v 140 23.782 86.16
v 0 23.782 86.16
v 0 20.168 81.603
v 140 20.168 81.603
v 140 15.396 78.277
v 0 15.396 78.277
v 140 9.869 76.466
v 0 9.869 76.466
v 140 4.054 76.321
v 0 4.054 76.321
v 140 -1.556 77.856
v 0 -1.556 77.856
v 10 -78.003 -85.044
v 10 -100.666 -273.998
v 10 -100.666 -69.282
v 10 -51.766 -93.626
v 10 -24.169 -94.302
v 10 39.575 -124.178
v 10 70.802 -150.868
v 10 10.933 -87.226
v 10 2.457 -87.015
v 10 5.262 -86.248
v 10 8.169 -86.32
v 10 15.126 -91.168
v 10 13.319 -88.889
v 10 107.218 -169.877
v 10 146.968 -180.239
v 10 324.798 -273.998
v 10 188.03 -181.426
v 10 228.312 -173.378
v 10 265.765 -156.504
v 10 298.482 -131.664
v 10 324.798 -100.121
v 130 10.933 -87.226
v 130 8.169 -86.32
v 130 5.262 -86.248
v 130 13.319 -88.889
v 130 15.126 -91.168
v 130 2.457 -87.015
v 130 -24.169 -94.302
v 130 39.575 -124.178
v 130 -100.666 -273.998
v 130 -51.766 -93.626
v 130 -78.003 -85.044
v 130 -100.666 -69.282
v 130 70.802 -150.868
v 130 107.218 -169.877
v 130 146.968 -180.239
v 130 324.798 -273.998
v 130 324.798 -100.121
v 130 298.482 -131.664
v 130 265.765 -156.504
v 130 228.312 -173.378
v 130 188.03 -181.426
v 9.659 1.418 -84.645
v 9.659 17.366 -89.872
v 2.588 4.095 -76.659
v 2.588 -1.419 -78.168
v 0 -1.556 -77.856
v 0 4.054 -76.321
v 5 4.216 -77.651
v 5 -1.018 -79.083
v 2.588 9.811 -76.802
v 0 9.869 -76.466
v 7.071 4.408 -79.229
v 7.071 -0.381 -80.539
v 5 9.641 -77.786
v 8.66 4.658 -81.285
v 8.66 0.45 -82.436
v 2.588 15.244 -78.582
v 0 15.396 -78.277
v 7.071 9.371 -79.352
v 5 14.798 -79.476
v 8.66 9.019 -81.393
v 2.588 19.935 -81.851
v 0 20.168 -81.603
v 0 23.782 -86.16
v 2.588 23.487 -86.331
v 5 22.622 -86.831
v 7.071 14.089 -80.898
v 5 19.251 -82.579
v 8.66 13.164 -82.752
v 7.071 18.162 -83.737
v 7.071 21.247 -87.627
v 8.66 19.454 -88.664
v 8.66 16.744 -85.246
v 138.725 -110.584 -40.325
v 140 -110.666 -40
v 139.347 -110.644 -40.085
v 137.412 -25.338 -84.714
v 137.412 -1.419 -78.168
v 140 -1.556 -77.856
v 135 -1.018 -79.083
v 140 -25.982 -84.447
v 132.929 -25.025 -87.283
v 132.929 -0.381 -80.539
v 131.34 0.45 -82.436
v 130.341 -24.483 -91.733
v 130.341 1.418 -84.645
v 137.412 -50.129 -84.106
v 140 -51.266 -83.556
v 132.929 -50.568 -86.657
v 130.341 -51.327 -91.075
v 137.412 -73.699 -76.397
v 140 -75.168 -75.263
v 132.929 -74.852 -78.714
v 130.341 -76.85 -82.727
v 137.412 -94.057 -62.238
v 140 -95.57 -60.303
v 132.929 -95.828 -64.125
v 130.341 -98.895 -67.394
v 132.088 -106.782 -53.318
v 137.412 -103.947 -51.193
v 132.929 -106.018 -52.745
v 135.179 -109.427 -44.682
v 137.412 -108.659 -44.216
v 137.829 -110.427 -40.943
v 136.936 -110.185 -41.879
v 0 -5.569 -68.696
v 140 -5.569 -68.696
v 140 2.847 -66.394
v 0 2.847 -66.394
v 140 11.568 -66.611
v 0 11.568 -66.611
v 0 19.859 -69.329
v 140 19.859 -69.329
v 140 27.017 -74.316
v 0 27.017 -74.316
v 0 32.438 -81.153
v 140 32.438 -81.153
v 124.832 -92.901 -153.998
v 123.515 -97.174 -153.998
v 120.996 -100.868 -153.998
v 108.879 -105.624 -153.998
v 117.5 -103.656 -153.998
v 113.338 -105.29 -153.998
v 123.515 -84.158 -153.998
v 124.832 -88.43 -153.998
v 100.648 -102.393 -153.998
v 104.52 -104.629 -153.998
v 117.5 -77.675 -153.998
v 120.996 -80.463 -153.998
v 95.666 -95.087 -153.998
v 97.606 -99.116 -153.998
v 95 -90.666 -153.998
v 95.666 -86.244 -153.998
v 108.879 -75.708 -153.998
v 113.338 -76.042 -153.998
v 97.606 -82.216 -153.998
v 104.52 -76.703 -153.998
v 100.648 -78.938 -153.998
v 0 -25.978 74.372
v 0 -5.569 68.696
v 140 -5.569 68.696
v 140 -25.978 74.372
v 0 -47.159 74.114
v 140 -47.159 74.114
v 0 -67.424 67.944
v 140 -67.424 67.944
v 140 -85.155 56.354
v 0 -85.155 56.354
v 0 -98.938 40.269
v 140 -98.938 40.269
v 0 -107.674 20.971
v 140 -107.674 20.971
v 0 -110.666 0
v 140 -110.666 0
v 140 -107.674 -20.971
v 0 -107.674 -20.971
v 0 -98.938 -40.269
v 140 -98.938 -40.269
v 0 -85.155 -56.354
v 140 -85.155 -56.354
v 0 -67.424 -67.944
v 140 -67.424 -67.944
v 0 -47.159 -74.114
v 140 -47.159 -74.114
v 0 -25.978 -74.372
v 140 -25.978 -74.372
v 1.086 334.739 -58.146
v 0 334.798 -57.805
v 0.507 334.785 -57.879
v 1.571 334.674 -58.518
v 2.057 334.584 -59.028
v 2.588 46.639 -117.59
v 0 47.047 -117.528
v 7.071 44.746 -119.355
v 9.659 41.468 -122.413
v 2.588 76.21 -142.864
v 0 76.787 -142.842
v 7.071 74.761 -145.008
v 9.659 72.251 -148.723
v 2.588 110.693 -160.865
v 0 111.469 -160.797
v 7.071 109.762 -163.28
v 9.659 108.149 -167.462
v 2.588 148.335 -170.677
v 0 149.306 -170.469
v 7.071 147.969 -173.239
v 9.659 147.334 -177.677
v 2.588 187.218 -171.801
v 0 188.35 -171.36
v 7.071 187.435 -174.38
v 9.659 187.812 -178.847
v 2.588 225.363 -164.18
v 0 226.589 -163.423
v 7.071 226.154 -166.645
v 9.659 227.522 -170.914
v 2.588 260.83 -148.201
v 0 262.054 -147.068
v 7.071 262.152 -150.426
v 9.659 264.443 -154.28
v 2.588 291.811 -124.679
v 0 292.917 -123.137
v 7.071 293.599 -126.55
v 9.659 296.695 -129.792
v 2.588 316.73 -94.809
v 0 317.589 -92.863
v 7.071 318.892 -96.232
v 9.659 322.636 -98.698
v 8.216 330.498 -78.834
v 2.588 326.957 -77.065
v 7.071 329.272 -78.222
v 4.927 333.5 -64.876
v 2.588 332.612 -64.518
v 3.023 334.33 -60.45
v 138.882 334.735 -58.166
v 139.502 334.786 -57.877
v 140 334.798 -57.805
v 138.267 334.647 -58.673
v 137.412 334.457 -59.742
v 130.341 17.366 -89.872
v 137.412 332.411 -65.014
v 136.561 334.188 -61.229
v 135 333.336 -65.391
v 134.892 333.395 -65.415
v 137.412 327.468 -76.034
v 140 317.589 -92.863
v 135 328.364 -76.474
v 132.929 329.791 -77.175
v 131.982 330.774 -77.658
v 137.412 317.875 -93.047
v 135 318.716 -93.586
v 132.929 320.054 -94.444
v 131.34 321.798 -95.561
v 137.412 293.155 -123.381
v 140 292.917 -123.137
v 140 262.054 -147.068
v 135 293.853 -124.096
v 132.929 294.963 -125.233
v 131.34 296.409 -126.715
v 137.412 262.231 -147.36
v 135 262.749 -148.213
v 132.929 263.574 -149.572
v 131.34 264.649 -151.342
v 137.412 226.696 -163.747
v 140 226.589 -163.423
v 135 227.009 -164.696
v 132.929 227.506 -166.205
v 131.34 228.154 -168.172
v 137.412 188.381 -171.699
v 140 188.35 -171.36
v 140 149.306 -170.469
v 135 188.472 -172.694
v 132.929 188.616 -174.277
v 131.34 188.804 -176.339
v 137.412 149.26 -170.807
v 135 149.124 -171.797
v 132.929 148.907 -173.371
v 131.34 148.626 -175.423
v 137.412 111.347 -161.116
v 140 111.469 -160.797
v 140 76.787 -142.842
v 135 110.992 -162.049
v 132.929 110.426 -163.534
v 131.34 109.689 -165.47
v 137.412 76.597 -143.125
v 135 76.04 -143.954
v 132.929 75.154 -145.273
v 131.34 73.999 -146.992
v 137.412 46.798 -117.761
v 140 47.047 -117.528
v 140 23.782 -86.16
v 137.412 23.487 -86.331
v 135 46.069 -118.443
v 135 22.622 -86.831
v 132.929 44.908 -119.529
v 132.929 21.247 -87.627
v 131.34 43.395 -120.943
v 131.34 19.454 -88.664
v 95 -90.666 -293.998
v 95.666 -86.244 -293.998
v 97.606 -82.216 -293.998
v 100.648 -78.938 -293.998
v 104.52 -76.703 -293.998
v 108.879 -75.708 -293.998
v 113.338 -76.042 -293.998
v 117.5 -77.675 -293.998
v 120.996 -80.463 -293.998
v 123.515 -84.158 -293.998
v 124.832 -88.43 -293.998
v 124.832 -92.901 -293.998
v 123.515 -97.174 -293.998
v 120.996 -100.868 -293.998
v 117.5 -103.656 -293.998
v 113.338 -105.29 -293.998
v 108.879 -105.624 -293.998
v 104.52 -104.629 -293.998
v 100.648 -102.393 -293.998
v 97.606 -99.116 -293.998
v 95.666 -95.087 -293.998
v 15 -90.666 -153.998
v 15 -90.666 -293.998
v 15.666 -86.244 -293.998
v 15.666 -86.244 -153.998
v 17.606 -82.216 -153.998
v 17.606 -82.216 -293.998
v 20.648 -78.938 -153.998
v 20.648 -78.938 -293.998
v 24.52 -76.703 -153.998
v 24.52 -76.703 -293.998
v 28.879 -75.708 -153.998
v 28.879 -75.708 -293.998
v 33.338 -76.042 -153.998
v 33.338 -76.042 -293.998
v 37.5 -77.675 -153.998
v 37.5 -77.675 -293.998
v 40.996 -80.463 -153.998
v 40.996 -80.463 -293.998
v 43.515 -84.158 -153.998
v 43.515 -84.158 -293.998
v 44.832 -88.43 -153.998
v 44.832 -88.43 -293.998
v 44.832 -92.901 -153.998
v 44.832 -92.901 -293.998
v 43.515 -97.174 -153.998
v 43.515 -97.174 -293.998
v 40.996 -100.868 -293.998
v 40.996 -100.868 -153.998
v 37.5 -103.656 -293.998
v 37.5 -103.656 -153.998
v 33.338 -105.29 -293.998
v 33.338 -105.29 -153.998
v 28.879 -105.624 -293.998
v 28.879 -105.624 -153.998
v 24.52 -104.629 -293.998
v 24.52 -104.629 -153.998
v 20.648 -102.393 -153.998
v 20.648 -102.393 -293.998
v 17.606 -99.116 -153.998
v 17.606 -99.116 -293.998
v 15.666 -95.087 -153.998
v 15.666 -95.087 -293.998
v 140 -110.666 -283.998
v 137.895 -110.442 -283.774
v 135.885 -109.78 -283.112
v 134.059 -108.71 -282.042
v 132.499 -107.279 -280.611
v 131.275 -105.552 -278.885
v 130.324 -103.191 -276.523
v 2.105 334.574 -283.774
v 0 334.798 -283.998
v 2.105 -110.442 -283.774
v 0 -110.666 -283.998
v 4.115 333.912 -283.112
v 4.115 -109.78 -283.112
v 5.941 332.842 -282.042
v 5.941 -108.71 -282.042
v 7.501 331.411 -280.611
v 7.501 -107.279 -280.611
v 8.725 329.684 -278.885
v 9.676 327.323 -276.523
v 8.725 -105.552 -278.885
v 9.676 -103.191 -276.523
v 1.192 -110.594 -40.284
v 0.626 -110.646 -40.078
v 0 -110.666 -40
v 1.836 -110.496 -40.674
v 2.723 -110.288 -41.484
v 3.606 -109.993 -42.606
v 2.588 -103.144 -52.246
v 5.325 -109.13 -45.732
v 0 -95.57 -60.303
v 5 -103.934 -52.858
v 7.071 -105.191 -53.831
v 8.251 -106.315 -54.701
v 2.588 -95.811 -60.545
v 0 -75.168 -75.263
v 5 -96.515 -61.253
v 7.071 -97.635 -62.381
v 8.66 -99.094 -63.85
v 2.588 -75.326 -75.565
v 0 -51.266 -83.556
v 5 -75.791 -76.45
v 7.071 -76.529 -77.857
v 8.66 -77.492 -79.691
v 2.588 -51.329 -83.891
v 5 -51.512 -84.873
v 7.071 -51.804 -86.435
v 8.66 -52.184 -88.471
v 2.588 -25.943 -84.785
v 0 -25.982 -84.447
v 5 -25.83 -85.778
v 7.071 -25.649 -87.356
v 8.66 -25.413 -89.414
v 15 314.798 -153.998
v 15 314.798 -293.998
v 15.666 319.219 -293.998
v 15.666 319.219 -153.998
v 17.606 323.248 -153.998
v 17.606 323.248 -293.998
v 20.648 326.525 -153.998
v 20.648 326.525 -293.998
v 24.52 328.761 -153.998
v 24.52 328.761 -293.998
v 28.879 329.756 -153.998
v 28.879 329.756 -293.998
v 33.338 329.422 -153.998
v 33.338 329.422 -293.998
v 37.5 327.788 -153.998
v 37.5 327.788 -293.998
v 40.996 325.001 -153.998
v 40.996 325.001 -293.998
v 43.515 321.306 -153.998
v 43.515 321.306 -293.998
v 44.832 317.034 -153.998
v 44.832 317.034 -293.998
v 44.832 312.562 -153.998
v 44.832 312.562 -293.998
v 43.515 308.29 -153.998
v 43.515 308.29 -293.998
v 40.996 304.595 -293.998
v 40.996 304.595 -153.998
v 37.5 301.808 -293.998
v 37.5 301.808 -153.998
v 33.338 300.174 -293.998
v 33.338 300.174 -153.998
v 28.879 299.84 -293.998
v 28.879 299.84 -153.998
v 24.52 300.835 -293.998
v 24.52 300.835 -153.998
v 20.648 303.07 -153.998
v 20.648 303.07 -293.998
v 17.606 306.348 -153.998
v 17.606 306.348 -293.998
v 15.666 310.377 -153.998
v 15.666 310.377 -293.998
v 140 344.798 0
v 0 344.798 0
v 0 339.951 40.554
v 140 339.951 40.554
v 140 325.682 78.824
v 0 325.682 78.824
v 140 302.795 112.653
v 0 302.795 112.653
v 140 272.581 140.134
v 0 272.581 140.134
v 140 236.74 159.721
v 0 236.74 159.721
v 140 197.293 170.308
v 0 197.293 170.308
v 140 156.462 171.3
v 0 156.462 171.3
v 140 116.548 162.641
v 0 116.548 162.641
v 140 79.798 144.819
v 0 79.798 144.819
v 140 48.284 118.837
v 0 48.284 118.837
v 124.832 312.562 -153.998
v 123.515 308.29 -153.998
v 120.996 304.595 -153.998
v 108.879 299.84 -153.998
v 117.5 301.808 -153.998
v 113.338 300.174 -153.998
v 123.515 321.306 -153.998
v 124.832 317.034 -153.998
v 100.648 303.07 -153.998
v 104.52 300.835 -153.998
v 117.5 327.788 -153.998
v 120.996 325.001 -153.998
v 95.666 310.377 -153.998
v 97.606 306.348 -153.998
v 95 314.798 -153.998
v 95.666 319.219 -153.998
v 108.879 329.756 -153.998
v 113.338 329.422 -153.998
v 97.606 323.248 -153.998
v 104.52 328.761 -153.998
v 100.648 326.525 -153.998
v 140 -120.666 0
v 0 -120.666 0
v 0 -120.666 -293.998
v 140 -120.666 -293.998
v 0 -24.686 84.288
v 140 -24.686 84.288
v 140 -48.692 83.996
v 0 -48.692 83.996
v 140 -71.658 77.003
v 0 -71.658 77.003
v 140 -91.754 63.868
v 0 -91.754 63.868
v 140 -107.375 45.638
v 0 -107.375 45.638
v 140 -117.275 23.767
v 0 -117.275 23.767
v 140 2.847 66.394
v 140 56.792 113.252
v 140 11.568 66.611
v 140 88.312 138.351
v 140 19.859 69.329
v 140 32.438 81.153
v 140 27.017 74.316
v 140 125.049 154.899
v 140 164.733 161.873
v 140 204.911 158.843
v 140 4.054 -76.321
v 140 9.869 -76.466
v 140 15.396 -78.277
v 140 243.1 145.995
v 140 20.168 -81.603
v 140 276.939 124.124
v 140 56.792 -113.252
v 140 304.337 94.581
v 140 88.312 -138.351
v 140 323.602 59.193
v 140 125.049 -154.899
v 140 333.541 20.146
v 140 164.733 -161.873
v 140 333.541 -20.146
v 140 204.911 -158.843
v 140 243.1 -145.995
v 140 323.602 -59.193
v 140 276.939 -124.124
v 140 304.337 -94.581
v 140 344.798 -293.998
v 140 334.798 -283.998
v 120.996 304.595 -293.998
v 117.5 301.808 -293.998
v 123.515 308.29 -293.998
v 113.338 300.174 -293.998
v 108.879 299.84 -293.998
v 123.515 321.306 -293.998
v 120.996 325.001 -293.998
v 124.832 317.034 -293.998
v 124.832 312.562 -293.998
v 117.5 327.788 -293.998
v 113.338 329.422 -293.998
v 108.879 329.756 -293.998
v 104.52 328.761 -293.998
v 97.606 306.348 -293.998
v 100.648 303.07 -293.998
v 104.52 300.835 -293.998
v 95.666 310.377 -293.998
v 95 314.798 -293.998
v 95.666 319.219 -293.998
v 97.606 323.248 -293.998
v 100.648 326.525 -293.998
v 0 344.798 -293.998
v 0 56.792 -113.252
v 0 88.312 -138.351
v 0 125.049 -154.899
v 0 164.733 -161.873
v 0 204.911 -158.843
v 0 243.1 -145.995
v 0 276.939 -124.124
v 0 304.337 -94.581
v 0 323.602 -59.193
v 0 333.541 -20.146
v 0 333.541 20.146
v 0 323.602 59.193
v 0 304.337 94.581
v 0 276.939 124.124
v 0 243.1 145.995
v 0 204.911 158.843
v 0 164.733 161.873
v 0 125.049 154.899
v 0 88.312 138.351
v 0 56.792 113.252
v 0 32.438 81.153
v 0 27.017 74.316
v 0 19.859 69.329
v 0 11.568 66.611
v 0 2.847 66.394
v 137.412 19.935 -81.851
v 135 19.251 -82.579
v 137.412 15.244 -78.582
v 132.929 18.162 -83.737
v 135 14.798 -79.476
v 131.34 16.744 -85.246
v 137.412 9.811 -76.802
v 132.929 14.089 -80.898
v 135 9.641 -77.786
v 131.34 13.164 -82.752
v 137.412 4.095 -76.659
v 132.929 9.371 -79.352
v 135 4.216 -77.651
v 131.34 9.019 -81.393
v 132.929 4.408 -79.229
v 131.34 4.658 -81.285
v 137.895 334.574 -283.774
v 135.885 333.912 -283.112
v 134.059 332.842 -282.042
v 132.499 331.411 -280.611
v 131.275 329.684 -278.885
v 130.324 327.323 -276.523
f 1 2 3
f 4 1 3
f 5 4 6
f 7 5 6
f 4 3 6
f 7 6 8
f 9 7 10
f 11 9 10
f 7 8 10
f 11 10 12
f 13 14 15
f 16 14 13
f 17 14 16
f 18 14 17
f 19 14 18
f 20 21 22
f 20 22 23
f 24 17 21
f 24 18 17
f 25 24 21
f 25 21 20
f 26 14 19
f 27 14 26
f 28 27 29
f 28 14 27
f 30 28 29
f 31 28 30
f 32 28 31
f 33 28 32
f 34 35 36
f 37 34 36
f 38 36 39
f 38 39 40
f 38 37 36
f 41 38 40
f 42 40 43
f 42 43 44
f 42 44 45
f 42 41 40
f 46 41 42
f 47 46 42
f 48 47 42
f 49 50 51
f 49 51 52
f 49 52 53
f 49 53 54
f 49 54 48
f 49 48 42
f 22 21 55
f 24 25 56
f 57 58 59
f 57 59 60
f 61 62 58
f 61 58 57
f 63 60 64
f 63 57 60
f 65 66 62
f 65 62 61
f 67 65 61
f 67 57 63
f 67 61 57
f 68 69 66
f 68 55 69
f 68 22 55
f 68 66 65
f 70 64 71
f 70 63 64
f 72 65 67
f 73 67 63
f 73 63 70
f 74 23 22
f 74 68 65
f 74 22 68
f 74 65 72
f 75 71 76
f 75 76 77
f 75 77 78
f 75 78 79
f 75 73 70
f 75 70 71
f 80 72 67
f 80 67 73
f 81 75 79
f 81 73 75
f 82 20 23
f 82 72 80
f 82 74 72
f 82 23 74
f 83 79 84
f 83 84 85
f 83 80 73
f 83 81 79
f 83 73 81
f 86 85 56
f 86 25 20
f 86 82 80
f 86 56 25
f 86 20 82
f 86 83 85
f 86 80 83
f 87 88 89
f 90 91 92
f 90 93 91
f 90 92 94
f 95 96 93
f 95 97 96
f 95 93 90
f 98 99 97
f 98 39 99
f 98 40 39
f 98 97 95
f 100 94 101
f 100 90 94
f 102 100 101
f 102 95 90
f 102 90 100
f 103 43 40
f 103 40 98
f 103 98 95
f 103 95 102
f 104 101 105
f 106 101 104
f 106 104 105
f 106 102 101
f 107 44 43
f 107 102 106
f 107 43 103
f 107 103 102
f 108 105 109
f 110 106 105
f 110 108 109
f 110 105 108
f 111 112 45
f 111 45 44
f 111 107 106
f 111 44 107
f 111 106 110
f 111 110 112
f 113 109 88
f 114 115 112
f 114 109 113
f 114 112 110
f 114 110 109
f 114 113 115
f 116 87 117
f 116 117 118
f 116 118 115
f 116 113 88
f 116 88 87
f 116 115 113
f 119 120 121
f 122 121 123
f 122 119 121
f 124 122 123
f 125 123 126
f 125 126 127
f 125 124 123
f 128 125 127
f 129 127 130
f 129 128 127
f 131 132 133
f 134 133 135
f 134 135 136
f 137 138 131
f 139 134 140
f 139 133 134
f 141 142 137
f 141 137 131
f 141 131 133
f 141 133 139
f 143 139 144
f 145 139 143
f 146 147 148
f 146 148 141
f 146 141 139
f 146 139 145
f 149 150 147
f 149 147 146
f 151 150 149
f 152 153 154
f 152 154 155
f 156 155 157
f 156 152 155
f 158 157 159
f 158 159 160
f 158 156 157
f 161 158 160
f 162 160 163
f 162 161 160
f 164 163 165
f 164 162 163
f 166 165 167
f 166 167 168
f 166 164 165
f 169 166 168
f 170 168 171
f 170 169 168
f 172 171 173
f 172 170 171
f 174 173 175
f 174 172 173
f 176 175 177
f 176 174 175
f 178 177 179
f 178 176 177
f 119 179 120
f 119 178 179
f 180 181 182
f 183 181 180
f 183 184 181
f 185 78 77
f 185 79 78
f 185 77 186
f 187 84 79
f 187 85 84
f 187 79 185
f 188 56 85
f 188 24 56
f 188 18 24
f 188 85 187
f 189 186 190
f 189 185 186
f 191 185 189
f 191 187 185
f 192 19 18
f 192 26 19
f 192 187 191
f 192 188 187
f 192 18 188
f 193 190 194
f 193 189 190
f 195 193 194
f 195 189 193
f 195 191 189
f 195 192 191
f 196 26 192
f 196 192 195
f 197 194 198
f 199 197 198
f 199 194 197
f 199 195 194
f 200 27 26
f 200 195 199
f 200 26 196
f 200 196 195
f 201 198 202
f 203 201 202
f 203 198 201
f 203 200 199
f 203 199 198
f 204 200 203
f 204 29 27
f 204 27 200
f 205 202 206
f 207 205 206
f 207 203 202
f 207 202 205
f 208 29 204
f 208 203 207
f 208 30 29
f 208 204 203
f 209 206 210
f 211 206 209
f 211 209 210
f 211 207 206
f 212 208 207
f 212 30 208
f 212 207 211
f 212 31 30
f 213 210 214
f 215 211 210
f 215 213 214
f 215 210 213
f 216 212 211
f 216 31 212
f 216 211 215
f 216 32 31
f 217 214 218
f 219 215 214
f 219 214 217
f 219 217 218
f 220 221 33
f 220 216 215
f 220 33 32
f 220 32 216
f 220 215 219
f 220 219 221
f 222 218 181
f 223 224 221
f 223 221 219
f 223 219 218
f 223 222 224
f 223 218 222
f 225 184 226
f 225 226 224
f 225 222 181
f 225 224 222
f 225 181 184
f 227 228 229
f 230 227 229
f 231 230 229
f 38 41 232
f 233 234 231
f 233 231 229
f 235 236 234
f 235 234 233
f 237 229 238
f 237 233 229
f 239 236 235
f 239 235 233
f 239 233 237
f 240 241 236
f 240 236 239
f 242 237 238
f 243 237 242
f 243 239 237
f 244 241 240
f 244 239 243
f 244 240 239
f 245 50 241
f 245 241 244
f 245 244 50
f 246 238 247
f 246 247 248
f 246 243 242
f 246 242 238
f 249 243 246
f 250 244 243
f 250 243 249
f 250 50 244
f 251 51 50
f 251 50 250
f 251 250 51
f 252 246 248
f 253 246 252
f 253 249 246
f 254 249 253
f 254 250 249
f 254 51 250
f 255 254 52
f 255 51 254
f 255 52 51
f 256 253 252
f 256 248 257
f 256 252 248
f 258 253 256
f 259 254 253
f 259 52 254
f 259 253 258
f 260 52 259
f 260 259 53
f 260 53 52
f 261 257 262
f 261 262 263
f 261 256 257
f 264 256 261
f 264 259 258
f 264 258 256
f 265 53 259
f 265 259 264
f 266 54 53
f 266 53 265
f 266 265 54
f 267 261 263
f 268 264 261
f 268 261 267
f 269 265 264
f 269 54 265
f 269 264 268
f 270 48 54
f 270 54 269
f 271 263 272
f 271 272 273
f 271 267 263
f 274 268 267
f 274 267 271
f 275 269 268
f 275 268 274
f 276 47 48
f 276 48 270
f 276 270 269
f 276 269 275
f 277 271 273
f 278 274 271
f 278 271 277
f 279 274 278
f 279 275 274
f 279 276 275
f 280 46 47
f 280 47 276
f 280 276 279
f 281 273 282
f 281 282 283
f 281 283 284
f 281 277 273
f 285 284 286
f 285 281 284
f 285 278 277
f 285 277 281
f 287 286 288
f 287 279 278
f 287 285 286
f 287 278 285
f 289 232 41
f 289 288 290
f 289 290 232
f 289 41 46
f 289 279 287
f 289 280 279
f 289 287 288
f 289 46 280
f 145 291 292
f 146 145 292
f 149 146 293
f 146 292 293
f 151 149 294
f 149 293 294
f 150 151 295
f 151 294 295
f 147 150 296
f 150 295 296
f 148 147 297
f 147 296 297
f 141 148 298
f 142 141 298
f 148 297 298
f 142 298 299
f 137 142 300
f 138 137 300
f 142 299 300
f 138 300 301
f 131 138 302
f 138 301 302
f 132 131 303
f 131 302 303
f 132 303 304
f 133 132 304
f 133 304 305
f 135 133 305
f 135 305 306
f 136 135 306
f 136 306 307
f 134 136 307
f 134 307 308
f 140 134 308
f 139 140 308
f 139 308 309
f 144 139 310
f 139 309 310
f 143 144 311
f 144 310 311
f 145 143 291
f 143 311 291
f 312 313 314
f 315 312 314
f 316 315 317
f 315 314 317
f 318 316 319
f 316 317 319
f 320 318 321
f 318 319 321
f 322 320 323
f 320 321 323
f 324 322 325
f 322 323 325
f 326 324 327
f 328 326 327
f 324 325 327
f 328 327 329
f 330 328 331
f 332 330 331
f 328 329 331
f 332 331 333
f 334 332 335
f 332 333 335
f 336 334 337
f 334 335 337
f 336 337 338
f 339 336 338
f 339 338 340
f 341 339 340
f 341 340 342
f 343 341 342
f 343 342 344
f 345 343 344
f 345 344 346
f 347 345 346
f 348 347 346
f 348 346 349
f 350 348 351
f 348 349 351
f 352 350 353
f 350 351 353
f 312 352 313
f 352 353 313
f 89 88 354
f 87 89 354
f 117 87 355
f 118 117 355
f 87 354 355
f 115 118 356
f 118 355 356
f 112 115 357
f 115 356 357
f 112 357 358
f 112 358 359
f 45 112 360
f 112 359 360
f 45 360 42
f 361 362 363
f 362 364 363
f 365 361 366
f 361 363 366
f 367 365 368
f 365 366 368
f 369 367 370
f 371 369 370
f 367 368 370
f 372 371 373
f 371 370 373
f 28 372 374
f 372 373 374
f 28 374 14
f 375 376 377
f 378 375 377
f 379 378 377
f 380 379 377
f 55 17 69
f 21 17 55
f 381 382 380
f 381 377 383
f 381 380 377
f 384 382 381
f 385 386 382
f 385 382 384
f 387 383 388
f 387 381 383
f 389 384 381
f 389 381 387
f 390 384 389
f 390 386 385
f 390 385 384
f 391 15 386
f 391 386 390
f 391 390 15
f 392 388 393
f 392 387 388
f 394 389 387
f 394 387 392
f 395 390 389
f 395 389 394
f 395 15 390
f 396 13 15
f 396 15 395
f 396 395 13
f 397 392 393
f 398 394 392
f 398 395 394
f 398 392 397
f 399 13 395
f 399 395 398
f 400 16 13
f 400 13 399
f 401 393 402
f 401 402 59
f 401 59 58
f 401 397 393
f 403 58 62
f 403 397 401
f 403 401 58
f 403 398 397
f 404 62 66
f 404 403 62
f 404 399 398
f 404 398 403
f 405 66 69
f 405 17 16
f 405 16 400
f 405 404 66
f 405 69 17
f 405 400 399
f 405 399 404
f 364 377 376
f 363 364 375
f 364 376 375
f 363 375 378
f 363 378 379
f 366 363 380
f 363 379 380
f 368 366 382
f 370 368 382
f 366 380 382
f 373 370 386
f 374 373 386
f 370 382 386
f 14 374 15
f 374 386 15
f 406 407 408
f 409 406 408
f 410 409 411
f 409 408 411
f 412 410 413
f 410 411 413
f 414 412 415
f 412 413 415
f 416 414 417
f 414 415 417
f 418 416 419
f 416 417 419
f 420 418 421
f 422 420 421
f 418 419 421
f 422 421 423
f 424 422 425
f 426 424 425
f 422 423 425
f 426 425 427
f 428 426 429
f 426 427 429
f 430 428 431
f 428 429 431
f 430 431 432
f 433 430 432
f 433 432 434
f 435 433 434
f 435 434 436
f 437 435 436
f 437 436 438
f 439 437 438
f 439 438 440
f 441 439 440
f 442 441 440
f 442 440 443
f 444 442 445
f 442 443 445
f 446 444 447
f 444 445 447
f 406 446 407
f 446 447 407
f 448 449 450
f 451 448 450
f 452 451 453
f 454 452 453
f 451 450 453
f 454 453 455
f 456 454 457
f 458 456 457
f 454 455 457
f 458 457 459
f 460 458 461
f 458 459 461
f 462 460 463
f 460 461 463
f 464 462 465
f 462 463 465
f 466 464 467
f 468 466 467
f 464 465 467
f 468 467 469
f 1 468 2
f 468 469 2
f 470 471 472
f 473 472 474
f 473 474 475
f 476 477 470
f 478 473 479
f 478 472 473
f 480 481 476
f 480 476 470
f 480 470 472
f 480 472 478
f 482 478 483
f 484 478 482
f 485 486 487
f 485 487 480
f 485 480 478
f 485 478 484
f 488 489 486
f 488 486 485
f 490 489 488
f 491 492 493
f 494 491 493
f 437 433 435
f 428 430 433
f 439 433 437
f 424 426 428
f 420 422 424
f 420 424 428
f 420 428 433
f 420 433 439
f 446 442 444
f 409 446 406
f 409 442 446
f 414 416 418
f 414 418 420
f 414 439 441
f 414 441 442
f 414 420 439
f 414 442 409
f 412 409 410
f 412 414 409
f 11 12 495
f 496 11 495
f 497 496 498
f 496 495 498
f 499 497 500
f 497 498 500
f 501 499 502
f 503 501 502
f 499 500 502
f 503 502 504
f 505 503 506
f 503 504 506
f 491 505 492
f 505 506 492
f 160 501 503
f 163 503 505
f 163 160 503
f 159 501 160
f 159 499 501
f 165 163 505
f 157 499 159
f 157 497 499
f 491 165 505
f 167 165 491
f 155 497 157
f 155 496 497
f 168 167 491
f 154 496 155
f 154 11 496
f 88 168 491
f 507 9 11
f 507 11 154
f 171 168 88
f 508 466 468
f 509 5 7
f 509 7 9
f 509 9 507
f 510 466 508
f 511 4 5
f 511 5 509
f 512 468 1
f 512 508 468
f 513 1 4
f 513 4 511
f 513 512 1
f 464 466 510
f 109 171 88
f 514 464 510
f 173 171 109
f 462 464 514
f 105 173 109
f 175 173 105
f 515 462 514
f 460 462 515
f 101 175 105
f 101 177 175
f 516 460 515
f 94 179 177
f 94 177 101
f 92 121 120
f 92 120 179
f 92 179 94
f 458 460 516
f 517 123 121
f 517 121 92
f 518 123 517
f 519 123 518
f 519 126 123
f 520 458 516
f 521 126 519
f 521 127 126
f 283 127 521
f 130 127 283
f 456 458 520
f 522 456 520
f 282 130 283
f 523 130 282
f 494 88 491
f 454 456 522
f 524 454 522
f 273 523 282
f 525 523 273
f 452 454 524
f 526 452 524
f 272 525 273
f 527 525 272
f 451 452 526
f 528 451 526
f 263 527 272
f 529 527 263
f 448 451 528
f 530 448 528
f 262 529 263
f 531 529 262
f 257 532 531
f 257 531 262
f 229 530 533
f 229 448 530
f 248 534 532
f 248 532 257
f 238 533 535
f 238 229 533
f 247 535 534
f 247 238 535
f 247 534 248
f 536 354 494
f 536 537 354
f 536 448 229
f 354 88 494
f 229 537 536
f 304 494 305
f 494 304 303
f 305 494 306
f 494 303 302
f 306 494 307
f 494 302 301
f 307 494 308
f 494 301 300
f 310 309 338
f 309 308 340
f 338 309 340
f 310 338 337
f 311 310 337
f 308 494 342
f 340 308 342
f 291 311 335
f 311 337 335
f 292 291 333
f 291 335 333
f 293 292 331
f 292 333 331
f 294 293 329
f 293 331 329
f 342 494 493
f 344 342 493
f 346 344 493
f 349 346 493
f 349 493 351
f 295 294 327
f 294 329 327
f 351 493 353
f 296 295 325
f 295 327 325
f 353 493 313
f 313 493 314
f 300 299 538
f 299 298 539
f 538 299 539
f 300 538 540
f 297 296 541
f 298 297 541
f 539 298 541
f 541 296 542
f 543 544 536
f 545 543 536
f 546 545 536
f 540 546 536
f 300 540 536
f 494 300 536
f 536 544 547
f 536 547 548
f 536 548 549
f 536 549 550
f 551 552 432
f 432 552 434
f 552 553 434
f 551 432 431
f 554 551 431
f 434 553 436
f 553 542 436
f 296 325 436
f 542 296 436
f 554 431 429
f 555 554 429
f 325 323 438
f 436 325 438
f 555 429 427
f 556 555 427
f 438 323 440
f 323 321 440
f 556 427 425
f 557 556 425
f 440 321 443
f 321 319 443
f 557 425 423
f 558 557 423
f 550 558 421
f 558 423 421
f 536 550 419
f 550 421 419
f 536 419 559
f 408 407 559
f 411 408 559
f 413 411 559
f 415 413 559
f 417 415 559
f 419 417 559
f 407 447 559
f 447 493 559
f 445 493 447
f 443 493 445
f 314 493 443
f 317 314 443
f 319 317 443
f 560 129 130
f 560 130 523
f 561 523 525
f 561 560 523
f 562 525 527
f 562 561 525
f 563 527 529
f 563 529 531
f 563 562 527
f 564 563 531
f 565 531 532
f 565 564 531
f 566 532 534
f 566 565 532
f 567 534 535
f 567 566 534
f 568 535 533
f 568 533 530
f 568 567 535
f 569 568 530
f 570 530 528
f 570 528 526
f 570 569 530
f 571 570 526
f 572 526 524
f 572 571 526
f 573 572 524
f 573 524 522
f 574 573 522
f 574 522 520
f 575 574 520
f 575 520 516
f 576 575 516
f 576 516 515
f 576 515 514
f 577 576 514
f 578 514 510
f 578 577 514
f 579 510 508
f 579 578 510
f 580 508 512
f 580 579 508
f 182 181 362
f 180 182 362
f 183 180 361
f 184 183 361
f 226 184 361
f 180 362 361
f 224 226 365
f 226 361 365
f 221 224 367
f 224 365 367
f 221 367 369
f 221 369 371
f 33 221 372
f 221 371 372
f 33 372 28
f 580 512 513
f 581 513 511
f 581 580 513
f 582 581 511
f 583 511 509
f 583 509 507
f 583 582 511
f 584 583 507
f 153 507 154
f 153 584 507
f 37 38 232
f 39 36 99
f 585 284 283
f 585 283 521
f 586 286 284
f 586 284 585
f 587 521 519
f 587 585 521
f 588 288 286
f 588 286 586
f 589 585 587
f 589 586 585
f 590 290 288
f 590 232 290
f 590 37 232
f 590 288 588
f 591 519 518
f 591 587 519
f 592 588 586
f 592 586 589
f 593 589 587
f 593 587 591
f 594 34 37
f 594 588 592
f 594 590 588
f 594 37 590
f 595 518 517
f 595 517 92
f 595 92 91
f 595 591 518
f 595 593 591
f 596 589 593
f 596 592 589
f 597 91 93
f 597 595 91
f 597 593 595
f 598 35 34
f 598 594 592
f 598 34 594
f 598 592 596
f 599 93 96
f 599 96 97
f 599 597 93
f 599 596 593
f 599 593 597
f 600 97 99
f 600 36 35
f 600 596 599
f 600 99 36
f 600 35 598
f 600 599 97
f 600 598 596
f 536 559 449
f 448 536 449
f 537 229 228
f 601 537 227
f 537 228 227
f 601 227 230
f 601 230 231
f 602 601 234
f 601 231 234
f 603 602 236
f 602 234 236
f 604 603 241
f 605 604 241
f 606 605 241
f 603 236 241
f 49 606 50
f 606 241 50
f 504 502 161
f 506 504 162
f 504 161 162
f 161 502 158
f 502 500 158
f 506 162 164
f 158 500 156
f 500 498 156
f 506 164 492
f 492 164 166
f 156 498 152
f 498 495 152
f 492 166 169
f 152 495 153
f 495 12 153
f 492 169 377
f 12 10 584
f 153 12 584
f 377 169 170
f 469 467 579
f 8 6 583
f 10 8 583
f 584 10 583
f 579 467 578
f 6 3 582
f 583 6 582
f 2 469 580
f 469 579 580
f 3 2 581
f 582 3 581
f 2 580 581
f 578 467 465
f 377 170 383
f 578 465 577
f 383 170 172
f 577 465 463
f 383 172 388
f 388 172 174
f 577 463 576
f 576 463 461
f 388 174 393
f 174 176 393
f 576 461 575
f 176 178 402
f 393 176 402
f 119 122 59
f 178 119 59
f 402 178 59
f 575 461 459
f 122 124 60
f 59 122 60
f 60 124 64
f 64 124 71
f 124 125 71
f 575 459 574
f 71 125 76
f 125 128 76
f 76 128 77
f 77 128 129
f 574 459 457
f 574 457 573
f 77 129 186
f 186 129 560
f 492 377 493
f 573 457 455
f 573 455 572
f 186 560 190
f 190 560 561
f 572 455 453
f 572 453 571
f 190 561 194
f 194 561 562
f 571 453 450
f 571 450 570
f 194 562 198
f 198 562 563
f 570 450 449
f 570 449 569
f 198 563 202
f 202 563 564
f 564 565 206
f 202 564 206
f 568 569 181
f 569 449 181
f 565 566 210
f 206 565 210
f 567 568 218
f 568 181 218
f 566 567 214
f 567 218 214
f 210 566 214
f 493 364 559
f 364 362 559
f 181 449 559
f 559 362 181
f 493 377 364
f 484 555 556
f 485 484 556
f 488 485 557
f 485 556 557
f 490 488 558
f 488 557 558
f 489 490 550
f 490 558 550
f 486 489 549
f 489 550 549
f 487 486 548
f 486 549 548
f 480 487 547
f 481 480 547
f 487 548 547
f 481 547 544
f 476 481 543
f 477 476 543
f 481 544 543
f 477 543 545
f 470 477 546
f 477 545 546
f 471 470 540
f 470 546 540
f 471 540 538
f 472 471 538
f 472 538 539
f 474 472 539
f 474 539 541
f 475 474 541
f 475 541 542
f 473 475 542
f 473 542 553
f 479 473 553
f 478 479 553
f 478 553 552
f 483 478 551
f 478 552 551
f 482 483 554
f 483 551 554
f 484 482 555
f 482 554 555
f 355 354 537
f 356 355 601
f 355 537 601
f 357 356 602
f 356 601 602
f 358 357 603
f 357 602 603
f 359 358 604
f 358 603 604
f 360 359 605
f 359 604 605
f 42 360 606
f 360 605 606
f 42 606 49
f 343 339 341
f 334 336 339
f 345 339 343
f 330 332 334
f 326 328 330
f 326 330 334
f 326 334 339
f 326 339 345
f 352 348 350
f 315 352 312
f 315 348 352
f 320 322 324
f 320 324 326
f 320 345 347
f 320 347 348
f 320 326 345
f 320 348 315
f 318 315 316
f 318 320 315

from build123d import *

# Parameters (mm, degrees)
BOSS_EXTRUDE1_DEPTH = 140
SKETCH2_R           = 15
CUT_EXTRUDE1_DEPTH  = 140
CUT_EXTRUDE2_START  = -10
CUT_EXTRUDE2_DEPTH  = 10
CUT_EXTRUDE3_DEPTH  = 10
FILLET1_R           = 10


with BuildPart() as part:
    # Sketch1 → Boss-Extrude1 (new body)
    with BuildSketch(Plane(origin=(0, 0, 0), x_dir=(0, 0, -1), z_dir=(1, 0, 0))):
        with BuildLine():
            Line((0, -120.66577438), (293.9982389, -120.66577438))
            Line((293.9982389, -120.66577438), (293.9982389, 344.79792692))
            Line((293.9982389, 344.79792692), (0, 344.79792692))
            ThreePointArc((0, 344.79792692), (-166.188863738, 217.33208751), (-86.160329475, 23.781803731))
            ThreePointArc((-86.160329475, 23.781803731), (-77.169593528, 12.698658653), (-77.855834661, -1.556112857))
            ThreePointArc((-77.855834661, -1.556112857), (-71.148862357, -82.172111425), (0, -120.66577438))
        make_face()
        with BuildLine():
            ThreePointArc((81.153066922, 32.43786067), (0, 334.79792692), (-81.153066922, 32.43786067))
            ThreePointArc((-81.153066922, 32.43786067), (-67.666963002, 15.813143052), (-68.696324701, -5.569014213))
            ThreePointArc((-68.696324701, -5.569014213), (0, -110.66577438), (68.696324701, -5.569014213))
            ThreePointArc((68.696324701, -5.569014213), (67.666963002, 15.813143052), (81.153066922, 32.43786067))
        make_face(mode=Mode.SUBTRACT)
    extrude(amount=BOSS_EXTRUDE1_DEPTH)

    # Sketch2 → Cut-Extrude1 (cut)
    with BuildSketch(Plane(origin=(0, 0, -293.9982389), x_dir=(-1, 0, 0), z_dir=(0, 0, -1))):
        with Locations((-110, 314.79792692)):
            Circle(SKETCH2_R)
        with Locations((-30, -90.66577438)):
            Circle(SKETCH2_R)
        with Locations((-110, -90.66577438)):
            Circle(SKETCH2_R)
        with Locations((-30, 314.79792692)):
            Circle(SKETCH2_R)
    extrude(amount=-CUT_EXTRUDE1_DEPTH, mode=Mode.SUBTRACT)

    # Sketch3 → Cut-Extrude2 (cut)
    with BuildSketch(Plane(origin=(140, 0, 0), x_dir=(0, 0, -1), z_dir=(1, 0, 0)).offset(CUT_EXTRUDE2_START)):
        with BuildLine():
            Line((40, -110.66577438), (283.9982389, -110.66577438))
            Line((283.9982389, -110.66577438), (283.9982389, 334.79792692))
            Line((283.9982389, 334.79792692), (57.804969406, 334.79792692))
            ThreePointArc((57.804969406, 334.79792692), (171.360027548, 188.350107316), (86.160329475, 23.781803731))
            ThreePointArc((86.160329475, 23.781803731), (77.169593528, 12.698658653), (77.855834661, -1.556112857))
            ThreePointArc((77.855834661, -1.556112857), (80.303978733, -63.527414671), (40, -110.66577438))
        make_face()
    extrude(amount=CUT_EXTRUDE2_DEPTH, mode=Mode.SUBTRACT)

    # Sketch4 → Cut-Extrude3 (cut)
    with BuildSketch(Plane.ZY):
        with BuildLine():
            Line((-57.804969406, 334.79792692), (-283.9982389, 334.79792692))
            Line((-283.9982389, 334.79792692), (-283.9982389, -110.66577438))
            Line((-283.9982389, -110.66577438), (-40, -110.66577438))
            ThreePointArc((-40, -110.66577438), (-80.303978733, -63.527414671), (-77.855834661, -1.556112857))
            ThreePointArc((-77.855834661, -1.556112857), (-77.169593528, 12.698658653), (-86.160329475, 23.781803731))
            ThreePointArc((-86.160329475, 23.781803731), (-171.360027548, 188.350107316), (-57.804969406, 334.79792692))
        make_face()
    extrude(amount=-CUT_EXTRUDE3_DEPTH, mode=Mode.SUBTRACT)

    # Fillet1
    fillet1_edges = [part.edges().sort_by_distance(p)[0] for p in [
        (130, 334.79792692, -170.901604153),
        (130, 112.06607627, -283.9982389),
        (130, -110.66577438, -161.99911945),
        (130, -63.527414671, -80.303978733),
        (130, 12.698658653, -77.169593528),
        (130, 188.350107316, -171.360027548),
        (10, 12.698658653, -77.169593528),
        (10, -63.527414671, -80.303978733),
        (10, -110.66577438, -161.99911945),
        (10, 112.06607627, -283.9982389),
        (10, 334.79792692, -170.901604153),
        (10, 188.350107316, -171.360027548),
    ]]
    fillet(fillet1_edges, radius=FILLET1_R - 0.0001)  # a hair under: the kernel refuses the full size


solid = part.part
